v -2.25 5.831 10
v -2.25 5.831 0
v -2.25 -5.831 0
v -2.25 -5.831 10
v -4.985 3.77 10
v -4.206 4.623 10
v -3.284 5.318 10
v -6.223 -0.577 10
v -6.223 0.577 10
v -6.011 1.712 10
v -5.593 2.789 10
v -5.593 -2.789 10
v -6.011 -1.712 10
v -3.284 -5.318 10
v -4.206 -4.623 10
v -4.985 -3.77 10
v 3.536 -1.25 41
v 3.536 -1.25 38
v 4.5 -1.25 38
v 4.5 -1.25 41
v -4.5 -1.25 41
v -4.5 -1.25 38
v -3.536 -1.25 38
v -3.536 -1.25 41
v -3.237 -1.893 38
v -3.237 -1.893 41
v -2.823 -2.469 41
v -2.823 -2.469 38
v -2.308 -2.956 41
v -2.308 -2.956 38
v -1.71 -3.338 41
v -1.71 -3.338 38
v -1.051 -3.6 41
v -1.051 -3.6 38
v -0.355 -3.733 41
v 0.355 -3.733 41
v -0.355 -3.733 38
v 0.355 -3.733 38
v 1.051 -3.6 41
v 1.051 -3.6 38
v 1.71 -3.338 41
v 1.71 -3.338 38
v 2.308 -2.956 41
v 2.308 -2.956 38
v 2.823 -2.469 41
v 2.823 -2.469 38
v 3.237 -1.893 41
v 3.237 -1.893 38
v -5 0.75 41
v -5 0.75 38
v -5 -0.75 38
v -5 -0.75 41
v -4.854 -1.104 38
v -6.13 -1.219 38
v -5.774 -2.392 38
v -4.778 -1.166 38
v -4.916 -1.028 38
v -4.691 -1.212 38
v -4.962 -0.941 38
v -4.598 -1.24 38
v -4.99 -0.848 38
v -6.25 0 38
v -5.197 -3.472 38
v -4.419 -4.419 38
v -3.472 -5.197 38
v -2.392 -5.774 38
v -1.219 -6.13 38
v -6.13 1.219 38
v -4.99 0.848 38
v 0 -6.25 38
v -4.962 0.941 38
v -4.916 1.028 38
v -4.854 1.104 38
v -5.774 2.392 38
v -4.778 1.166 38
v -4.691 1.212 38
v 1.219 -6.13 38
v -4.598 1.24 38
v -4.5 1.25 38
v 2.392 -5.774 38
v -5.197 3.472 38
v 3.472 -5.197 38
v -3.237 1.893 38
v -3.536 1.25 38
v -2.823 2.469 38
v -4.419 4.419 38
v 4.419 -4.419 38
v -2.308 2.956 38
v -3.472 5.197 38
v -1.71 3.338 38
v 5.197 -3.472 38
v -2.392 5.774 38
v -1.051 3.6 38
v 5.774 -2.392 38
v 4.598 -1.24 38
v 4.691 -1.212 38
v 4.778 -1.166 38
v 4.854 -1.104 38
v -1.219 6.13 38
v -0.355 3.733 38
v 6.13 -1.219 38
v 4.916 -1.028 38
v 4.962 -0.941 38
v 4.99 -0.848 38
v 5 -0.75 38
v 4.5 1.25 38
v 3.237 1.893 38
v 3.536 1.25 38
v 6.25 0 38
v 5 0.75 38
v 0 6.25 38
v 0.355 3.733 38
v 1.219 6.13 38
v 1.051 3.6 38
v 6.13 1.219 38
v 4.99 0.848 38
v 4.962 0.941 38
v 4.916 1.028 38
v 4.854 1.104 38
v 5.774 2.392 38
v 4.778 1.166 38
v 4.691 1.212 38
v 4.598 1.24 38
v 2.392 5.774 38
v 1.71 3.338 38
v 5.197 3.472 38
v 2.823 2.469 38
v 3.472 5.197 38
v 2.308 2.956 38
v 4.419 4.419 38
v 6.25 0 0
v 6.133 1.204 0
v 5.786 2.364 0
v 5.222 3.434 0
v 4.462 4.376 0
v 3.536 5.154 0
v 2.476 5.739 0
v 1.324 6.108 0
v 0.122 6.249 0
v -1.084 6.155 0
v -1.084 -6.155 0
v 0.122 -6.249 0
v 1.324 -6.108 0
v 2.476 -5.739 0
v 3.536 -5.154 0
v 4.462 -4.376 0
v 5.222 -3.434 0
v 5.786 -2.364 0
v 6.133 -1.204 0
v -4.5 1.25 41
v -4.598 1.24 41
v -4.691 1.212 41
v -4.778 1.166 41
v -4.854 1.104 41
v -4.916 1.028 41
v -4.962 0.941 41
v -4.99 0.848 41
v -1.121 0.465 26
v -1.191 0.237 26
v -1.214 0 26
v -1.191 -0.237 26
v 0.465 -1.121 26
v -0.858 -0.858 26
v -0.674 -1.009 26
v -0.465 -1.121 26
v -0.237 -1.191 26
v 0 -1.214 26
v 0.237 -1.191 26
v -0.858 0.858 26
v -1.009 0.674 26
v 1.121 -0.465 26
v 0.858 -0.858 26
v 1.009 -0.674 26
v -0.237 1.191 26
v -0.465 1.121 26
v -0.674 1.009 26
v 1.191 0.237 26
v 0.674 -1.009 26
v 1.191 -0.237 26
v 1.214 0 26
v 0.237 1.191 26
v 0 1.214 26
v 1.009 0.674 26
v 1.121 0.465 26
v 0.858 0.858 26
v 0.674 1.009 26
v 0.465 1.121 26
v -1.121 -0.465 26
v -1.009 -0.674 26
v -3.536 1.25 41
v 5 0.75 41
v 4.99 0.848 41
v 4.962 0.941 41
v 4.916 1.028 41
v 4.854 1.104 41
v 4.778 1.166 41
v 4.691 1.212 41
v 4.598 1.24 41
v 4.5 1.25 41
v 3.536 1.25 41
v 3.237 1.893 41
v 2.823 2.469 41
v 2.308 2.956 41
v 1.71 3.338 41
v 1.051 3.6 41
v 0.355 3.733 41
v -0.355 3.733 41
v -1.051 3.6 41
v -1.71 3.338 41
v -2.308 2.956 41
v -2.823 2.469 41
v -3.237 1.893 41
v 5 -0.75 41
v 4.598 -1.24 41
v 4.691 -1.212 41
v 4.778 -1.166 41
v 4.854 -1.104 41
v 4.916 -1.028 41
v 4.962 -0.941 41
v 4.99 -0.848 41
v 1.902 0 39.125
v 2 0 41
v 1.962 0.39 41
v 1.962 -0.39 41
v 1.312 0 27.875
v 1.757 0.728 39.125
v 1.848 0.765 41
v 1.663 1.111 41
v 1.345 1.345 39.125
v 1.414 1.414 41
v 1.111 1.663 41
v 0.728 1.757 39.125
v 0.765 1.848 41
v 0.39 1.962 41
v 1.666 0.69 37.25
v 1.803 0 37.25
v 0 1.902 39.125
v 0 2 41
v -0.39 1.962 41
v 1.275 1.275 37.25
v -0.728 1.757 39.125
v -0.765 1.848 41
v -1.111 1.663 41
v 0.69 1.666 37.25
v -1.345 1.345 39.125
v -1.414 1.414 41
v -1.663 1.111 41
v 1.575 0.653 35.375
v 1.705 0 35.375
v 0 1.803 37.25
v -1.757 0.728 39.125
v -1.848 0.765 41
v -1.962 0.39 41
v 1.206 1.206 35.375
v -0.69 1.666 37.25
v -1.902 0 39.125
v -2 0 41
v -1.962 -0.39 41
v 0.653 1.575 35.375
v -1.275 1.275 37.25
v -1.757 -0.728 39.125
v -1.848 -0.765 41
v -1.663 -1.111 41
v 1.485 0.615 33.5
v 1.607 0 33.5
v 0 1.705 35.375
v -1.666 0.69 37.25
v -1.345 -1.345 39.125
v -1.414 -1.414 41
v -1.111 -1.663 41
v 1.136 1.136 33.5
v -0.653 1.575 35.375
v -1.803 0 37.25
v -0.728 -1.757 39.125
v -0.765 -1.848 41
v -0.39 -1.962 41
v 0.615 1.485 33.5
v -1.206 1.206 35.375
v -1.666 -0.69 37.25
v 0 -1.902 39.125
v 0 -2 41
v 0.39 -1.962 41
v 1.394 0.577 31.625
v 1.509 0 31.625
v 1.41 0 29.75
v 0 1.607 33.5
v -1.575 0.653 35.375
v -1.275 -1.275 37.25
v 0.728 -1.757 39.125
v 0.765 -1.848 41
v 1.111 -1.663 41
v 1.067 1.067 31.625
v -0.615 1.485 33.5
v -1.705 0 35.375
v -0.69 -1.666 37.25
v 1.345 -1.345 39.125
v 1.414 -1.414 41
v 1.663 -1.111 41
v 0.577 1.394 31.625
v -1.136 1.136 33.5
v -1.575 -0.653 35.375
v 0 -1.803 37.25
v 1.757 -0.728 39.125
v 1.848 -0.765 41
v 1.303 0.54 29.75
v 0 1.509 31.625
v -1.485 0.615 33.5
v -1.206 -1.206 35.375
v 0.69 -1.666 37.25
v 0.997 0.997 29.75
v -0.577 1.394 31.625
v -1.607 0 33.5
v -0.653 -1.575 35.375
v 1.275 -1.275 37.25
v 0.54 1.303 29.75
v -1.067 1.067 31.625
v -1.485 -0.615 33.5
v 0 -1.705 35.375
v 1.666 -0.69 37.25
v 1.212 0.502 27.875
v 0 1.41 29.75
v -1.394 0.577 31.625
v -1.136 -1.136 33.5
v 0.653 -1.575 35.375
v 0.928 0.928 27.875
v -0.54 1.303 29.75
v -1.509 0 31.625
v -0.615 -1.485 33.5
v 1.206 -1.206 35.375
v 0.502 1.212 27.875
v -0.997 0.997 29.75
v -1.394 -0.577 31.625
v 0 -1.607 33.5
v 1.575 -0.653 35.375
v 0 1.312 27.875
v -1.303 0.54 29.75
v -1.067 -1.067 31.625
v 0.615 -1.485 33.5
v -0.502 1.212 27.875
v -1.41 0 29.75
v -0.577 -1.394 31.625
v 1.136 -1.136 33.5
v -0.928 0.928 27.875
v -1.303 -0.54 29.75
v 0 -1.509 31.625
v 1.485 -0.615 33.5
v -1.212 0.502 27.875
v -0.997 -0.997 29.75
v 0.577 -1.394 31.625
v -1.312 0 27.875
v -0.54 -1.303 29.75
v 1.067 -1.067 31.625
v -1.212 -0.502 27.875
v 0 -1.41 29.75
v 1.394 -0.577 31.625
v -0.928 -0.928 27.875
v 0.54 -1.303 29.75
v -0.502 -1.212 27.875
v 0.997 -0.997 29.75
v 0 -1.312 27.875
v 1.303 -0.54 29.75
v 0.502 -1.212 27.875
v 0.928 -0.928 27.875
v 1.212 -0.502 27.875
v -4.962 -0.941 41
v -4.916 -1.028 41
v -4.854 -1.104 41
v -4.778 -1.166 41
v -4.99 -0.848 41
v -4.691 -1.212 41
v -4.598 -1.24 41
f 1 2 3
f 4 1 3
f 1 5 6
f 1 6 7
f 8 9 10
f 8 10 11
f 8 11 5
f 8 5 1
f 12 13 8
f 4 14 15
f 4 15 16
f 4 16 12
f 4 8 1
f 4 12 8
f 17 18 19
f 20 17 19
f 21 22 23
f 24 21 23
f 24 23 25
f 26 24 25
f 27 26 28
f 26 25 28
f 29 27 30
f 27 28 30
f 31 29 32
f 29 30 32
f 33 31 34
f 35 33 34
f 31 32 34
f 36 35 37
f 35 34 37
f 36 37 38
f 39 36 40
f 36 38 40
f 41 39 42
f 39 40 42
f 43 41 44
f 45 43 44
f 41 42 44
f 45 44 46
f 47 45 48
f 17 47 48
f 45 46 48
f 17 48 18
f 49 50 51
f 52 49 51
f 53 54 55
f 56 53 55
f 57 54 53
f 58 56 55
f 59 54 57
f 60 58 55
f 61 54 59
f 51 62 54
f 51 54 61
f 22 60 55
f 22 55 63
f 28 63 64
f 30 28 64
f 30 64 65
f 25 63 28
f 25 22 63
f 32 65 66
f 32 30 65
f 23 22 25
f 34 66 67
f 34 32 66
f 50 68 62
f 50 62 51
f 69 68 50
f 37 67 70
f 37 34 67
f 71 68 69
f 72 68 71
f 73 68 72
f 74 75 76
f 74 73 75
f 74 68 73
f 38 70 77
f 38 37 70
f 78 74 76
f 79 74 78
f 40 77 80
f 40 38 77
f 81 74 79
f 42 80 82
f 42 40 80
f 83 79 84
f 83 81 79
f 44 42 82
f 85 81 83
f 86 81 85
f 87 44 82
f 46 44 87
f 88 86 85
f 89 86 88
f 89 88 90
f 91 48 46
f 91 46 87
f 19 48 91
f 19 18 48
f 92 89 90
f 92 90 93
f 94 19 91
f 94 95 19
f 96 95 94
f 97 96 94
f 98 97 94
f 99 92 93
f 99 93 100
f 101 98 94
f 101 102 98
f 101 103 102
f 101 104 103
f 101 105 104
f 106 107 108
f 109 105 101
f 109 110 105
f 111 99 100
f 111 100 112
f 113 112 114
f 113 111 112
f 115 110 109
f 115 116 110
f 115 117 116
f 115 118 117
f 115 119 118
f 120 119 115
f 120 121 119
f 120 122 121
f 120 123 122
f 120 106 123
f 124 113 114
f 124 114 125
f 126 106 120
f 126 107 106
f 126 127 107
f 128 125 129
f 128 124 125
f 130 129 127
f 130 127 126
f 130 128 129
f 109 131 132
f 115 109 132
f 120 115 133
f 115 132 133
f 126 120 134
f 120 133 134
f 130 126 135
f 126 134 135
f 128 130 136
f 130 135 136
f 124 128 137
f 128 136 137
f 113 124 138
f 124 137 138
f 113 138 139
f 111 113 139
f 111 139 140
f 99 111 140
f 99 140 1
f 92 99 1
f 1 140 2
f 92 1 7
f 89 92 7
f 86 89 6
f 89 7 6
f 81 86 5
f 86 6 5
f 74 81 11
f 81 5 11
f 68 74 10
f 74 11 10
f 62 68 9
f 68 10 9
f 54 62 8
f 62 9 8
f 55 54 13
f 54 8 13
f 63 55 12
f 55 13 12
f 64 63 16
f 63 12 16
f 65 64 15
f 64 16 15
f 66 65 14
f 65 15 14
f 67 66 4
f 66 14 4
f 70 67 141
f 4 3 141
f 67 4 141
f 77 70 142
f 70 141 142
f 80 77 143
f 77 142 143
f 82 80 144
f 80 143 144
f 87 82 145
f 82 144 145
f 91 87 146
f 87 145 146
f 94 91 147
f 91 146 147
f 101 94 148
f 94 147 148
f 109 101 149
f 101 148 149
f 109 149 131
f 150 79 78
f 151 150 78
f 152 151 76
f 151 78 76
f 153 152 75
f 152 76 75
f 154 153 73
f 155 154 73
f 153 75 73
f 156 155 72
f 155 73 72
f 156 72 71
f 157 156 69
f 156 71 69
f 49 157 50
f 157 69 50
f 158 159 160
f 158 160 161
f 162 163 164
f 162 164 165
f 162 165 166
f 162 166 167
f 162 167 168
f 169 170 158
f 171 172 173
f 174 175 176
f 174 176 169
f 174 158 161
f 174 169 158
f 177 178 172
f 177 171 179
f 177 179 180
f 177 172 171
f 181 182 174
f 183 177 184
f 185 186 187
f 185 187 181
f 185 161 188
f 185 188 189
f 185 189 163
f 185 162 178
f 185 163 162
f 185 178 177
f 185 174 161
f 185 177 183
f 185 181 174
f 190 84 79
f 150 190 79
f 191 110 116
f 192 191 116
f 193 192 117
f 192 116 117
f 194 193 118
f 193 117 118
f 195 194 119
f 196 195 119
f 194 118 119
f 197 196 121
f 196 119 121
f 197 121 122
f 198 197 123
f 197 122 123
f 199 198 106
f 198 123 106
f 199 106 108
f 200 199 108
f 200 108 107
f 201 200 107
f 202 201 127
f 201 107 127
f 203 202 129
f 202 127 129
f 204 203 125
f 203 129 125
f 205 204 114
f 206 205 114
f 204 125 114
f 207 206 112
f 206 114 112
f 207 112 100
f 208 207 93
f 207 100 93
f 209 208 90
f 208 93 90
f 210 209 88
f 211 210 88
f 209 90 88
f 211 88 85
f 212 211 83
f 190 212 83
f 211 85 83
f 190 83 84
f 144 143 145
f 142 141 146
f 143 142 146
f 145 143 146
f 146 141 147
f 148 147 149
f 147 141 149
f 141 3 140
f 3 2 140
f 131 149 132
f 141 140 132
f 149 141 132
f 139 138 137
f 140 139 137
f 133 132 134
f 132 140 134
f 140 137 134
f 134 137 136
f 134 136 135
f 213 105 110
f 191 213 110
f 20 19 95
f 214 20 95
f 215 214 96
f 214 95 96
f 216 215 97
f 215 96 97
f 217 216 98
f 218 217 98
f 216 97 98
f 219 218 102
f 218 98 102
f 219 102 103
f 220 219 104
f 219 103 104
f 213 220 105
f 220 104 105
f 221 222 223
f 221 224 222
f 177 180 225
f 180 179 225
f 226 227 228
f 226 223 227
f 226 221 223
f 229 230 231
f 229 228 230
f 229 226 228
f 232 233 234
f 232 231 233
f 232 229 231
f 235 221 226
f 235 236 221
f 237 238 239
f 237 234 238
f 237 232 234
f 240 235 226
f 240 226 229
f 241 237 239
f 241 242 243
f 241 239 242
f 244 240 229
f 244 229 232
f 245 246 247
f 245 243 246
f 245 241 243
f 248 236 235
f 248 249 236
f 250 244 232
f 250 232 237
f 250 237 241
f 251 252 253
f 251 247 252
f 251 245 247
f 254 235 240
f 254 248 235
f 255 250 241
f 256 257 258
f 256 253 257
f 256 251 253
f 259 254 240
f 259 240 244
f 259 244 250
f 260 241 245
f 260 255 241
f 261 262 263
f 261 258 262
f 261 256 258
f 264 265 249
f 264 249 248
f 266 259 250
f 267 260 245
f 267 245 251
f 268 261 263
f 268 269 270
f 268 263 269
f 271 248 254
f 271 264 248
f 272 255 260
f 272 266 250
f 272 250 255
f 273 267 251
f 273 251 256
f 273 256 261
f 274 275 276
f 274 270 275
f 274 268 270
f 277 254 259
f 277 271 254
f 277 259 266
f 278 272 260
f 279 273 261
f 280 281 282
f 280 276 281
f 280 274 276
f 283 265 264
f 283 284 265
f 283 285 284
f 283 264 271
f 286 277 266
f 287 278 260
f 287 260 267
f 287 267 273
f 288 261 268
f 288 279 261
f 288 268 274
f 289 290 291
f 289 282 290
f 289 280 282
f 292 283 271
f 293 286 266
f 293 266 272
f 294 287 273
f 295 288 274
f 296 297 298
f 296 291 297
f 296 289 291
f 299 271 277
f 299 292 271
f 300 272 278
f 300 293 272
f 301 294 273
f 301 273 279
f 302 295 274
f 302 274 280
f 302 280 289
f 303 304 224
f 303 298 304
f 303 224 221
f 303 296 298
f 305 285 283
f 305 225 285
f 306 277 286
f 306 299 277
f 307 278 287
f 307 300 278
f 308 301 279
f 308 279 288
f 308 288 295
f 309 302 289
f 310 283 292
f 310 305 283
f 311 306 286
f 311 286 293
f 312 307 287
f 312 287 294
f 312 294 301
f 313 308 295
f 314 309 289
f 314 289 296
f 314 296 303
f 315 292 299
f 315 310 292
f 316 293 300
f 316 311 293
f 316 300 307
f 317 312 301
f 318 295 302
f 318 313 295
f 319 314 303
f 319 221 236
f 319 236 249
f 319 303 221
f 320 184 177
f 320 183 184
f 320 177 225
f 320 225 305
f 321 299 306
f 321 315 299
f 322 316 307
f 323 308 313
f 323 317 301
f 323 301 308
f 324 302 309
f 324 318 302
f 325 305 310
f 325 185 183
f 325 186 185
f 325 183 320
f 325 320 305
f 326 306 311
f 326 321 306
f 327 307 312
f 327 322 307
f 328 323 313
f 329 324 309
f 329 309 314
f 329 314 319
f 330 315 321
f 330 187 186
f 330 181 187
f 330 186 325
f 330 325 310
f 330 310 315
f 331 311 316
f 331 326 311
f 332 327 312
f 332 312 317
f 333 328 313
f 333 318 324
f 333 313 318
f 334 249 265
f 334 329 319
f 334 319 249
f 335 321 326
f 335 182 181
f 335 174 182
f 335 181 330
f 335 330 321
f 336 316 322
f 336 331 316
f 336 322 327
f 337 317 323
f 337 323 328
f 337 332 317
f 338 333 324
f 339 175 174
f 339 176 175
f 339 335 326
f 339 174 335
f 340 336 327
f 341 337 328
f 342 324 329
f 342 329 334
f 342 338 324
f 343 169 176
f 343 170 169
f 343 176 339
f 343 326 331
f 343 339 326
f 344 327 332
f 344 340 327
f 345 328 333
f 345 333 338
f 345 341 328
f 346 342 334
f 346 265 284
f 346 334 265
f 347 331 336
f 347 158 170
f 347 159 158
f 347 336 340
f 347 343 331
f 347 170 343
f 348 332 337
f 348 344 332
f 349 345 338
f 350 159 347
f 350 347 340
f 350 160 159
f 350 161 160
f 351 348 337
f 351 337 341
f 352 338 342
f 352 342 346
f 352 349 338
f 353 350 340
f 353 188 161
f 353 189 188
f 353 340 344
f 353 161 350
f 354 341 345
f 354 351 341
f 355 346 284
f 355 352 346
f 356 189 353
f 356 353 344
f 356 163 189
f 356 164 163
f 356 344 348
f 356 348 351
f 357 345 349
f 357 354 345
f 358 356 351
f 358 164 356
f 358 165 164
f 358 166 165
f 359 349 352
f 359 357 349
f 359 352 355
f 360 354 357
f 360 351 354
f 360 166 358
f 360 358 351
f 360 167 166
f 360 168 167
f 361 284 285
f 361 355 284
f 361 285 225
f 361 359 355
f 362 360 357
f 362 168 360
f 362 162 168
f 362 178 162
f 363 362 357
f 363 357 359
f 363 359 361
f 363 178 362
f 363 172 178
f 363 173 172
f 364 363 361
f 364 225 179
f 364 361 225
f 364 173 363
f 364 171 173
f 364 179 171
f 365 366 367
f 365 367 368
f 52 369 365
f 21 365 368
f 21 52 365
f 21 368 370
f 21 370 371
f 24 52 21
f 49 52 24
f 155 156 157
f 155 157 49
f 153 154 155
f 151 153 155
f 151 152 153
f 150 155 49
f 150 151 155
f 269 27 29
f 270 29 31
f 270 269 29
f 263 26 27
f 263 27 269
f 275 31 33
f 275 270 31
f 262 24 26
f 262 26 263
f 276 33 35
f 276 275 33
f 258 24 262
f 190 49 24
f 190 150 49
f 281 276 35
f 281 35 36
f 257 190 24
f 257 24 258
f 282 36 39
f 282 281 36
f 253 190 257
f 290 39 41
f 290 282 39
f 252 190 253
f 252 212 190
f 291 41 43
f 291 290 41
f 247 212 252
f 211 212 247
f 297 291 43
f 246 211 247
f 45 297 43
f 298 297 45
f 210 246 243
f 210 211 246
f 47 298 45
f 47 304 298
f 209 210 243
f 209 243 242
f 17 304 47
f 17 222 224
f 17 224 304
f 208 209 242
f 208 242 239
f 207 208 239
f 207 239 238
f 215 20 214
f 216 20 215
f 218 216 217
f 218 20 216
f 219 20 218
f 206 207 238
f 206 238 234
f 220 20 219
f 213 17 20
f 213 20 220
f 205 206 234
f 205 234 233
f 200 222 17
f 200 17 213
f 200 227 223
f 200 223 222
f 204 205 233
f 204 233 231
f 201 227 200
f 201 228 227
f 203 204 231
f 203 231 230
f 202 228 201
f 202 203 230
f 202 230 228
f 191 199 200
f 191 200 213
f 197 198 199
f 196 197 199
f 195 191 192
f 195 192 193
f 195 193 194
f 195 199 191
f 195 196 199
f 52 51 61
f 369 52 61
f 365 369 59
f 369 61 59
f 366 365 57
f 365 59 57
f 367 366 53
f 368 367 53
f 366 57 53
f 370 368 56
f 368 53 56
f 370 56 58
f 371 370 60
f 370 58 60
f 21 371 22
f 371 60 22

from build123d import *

# Parameters (mm, degrees)
F0_R     = 6.25
F1_DEPTH = 38
F3_DEPTH = 3
F4_R     = 2
F5_DEPTH = 15
F5_TAPER = 3
F6_W     = 8
F6_H     = 15
F7_DEPTH = 10


with BuildPart() as f1:
    # F0 (on Top) → F1 (new body)
    with BuildSketch(Plane.XY):
        Circle(F0_R)
    extrude(amount=F1_DEPTH)

    # F2 (on face) → F3 (join)
    with BuildSketch(Plane.XY.offset(38)):
        with BuildLine():
            ThreePointArc((3.5355339059, -1.25), (3.6959945987, -0.6341324202), (3.75, 0))
            ThreePointArc((3.75, 0), (3.6959945987, 0.6341324202), (3.5355339059, 1.25))
            Line((3.5355339059, 1.25), (-3.5355339059, 1.25))
            ThreePointArc((-3.5355339059, 1.25), (-3.75, 0), (-3.5355339059, -1.25))
            Line((-3.5355339059, -1.25), (3.5355339059, -1.25))
        make_face()
        with BuildLine():
            ThreePointArc((3.5355339059, 1.25), (3.6959945987, 0.6341324202), (3.75, 0))
            ThreePointArc((3.75, 0), (3.6959945987, -0.6341324202), (3.5355339059, -1.25))
            Line((3.5355339059, -1.25), (4.5, -1.25))
            ThreePointArc((4.5, -1.25), (4.8535533906, -1.1035533906), (5, -0.75))
            Line((5, -0.75), (5, 0.75))
            ThreePointArc((5, 0.75), (4.8535533906, 1.1035533906), (4.5, 1.25))
            Line((4.5, 1.25), (3.5355339059, 1.25))
        make_face()
        with BuildLine():
            Line((-3.5355339059, 1.25), (3.5355339059, 1.25))
            ThreePointArc((3.5355339059, 1.25), (0, 3.75), (-3.5355339059, 1.25))
        make_face()
        with BuildLine():
            ThreePointArc((-3.5355339059, -1.25), (0, -3.75), (3.5355339059, -1.25))
            Line((3.5355339059, -1.25), (-3.5355339059, -1.25))
        make_face()
        with BuildLine():
            ThreePointArc((-3.5355339059, -1.25), (-3.75, 0), (-3.5355339059, 1.25))
            Line((-3.5355339059, 1.25), (-4.5, 1.25))
            ThreePointArc((-4.5, 1.25), (-4.8535533906, 1.1035533906), (-5, 0.75))
            Line((-5, 0.75), (-5, -0.75))
            ThreePointArc((-5, -0.75), (-4.8535533906, -1.1035533906), (-4.5, -1.25))
            Line((-4.5, -1.25), (-3.5355339059, -1.25))
        make_face()
    extrude(amount=F3_DEPTH)

    # F4 (on face) → F5 (cut)
    with BuildSketch(Plane.XY.offset(41)):
        Circle(F4_R)
    extrude(amount=-F5_DEPTH, taper=F5_TAPER, mode=Mode.SUBTRACT)

    # F6 (on face) → F7 (cut)
    with BuildSketch(Plane(origin=(0, 0, 0), x_dir=(1, 0, 0), z_dir=(0, 0, -1))):
        with Locations((-6.25, 0)):
            Rectangle(F6_W, F6_H)
    extrude(amount=-F7_DEPTH, mode=Mode.SUBTRACT)


solid = f1.part
